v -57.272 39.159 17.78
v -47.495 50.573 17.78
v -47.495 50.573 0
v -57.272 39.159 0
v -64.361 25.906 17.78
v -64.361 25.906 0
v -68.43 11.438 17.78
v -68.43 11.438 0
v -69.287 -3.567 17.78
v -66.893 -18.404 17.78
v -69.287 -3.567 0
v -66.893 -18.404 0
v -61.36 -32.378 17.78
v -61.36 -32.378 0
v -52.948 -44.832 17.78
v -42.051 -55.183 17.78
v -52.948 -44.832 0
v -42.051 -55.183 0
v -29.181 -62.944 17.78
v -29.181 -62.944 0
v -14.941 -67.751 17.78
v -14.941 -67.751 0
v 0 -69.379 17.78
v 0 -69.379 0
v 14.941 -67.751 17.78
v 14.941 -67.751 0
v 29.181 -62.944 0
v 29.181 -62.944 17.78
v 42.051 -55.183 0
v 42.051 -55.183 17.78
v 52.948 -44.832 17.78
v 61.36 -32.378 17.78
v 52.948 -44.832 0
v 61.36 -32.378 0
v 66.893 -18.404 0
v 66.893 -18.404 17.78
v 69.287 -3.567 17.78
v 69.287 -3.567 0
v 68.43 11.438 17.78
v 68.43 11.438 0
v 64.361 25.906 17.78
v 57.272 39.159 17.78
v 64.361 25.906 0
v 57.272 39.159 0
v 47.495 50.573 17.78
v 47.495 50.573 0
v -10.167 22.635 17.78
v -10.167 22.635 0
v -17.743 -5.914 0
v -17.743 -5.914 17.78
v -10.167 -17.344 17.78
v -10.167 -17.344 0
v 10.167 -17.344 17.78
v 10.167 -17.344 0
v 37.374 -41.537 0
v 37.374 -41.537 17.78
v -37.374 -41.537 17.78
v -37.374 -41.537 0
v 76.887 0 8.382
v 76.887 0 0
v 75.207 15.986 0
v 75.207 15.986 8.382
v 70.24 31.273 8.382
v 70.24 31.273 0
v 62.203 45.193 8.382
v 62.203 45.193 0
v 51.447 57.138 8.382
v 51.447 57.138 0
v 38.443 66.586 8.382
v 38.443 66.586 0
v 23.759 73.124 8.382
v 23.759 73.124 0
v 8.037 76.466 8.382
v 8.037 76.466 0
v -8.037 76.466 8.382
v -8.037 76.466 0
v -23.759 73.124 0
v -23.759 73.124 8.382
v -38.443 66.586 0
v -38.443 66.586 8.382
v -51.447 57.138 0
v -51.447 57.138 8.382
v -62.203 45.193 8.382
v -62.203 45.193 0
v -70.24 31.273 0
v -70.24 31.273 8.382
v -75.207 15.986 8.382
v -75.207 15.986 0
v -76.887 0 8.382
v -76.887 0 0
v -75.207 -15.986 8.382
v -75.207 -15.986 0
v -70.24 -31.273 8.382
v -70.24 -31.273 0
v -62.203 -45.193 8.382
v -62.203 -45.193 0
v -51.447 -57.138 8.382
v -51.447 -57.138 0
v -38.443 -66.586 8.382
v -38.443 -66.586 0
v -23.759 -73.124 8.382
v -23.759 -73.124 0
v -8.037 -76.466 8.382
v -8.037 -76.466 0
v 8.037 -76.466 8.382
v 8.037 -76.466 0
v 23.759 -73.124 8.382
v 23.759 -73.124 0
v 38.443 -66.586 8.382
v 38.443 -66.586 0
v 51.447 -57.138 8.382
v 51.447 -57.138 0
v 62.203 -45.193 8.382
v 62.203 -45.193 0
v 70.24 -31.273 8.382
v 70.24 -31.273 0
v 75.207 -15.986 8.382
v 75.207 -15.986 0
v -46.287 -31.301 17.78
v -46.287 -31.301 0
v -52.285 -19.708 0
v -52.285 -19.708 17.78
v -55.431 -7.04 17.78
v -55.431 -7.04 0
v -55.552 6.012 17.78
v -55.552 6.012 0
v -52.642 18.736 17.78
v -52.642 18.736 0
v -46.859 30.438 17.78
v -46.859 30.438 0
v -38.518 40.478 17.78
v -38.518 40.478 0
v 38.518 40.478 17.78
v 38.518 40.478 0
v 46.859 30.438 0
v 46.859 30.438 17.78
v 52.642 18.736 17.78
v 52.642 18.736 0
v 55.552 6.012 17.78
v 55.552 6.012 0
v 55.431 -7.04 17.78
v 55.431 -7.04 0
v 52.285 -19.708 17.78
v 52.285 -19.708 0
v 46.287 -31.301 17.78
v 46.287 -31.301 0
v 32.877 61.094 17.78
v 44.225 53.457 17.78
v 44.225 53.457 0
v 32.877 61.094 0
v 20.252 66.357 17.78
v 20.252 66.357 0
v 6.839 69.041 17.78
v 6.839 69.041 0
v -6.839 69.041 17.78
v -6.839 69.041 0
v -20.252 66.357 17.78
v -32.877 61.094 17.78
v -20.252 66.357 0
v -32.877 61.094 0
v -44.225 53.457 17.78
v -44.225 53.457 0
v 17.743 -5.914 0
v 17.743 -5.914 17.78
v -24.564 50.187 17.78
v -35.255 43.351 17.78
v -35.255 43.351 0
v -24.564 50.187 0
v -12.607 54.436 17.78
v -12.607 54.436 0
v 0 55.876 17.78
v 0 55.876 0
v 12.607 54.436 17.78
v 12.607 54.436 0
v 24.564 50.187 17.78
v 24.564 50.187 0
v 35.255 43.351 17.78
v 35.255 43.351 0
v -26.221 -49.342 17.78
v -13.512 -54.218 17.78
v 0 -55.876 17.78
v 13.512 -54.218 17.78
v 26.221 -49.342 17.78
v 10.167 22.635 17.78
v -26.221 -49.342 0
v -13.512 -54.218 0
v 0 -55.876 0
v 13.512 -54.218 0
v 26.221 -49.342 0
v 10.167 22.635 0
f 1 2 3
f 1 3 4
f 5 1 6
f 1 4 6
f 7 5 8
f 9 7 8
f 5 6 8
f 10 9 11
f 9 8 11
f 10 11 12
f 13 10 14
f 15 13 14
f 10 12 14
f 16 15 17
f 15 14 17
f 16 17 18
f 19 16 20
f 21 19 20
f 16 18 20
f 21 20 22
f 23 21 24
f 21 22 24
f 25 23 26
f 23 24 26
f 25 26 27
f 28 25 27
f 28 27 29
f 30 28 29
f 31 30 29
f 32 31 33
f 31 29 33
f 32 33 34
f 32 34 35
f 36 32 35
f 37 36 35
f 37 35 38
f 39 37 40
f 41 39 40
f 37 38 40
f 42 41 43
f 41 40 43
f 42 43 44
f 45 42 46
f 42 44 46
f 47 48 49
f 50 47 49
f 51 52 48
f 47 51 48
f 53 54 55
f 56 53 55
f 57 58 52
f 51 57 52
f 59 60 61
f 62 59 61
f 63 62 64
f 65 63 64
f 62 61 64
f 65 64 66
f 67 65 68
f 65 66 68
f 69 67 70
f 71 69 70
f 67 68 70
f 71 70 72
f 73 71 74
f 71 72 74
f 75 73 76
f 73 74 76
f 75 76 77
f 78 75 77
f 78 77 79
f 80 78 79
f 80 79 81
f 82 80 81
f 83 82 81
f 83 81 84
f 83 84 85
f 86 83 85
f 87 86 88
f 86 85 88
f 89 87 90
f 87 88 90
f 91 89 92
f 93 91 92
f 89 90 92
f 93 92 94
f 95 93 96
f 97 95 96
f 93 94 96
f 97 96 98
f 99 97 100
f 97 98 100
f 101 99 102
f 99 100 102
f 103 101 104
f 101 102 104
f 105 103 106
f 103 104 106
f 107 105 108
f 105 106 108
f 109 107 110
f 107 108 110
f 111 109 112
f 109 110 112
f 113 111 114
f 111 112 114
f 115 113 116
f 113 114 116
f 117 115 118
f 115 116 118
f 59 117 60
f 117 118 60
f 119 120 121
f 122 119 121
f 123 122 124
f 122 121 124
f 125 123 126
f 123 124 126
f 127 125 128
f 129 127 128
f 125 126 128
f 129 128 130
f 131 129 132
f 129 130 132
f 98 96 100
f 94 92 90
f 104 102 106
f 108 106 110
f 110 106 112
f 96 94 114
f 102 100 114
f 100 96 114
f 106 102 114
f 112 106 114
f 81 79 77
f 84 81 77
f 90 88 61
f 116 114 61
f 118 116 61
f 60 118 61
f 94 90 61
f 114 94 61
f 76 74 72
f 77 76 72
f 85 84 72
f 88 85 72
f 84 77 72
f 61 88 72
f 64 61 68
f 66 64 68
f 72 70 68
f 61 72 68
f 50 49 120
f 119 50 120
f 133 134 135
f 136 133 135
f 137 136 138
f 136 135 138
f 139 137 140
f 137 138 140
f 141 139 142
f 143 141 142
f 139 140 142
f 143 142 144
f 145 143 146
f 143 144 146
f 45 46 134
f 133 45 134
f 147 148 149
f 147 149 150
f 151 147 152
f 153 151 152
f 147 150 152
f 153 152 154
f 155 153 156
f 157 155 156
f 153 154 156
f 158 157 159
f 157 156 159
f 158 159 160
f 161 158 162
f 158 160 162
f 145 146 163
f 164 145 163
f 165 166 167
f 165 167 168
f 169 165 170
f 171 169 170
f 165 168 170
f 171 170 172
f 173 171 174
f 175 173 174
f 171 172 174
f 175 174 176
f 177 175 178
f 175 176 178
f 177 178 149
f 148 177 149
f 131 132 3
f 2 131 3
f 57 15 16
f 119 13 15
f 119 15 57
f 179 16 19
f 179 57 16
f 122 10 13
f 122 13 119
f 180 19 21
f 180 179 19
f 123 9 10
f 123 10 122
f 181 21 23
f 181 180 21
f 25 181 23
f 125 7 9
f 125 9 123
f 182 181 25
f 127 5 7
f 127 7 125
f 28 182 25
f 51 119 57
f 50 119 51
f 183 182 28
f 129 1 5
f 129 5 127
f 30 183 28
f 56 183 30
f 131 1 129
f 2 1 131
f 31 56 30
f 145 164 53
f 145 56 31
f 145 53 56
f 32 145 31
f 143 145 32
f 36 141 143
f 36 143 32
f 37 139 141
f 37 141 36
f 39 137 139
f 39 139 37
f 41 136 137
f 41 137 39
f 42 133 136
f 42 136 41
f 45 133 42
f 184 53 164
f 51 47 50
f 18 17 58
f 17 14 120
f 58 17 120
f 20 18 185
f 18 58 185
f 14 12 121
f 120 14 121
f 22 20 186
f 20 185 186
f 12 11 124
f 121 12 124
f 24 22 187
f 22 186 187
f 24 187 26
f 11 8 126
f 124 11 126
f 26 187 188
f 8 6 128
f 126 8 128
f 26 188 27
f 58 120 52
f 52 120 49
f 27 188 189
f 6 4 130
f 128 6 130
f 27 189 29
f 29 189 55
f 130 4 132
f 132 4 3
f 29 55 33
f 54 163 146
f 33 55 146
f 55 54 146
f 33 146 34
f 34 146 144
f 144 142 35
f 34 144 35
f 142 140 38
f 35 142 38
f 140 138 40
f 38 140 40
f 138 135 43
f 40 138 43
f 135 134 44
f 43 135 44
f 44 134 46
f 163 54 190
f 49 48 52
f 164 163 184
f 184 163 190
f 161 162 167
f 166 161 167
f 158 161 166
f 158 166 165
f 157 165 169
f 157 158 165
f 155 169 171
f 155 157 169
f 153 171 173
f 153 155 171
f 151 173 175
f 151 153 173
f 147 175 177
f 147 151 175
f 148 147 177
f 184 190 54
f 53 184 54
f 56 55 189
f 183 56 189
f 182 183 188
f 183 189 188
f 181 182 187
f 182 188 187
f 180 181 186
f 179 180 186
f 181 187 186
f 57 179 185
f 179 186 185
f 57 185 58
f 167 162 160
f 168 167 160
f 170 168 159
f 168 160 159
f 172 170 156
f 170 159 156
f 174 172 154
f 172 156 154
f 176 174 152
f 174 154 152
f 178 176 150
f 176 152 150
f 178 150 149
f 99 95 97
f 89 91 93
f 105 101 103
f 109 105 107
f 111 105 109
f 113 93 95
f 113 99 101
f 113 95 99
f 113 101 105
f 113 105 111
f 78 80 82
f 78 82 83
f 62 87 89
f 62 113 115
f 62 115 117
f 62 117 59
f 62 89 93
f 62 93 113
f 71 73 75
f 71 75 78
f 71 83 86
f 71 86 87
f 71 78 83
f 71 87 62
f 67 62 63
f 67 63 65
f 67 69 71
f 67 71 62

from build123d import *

# Parameters (mm, degrees)
F1_DEPTH = 17.78
F2_R     = 76.886719
F3_DEPTH = 8.382


with BuildPart() as f1:
    # F0 (on Top) → F1 (new body)
    with BuildSketch(Plane.XY):
        with BuildLine():
            Line((-44.224784, 53.456584), (-35.254574, 43.350696))
            ThreePointArc((-35.254574, 43.350696), (0, 55.876362), (35.254574, 43.350696))
            Line((35.254574, 43.350696), (44.224784, 53.456584))
            ThreePointArc((44.224784, 53.456584), (0, 69.378944), (-44.224784, 53.456584))
        make_face()
        with BuildLine():
            Line((-38.518488, 40.478314), (-47.495037, 50.573306))
            ThreePointArc((-47.495037, 50.573306), (0, -69.378944), (47.495037, 50.573306))
            Line((47.495037, 50.573306), (38.518488, 40.478314))
            ThreePointArc((38.518488, 40.478314), (55.551995, 6.011961), (46.286554, -31.300523))
            Line((46.286554, -31.300523), (17.743081, -5.91436))
            Line((17.743081, -5.91436), (10.167384, 22.634802))
            Line((10.167384, 22.634802), (10.167384, -17.344361))
            Line((10.167384, -17.344361), (37.374363, -41.537029))
            ThreePointArc((37.374363, -41.537029), (0, -55.876362), (-37.374363, -41.537029))
            Line((-37.374363, -41.537029), (-10.167384, -17.344361))
            Line((-10.167384, -17.344361), (-10.167384, 22.634802))
            Line((-10.167384, 22.634802), (-17.743081, -5.91436))
            Line((-17.743081, -5.91436), (-46.286554, -31.300523))
            ThreePointArc((-46.286554, -31.300523), (-55.551995, 6.011961), (-38.518488, 40.478314))
        make_face()
    extrude(amount=F1_DEPTH)


with BuildPart() as f3:
    # F2 (on Top) → F3 (new body)
    with BuildSketch(Plane.XY):
        Circle(F2_R)
    extrude(amount=F3_DEPTH)


solid = Compound([f1.part, f3.part])
